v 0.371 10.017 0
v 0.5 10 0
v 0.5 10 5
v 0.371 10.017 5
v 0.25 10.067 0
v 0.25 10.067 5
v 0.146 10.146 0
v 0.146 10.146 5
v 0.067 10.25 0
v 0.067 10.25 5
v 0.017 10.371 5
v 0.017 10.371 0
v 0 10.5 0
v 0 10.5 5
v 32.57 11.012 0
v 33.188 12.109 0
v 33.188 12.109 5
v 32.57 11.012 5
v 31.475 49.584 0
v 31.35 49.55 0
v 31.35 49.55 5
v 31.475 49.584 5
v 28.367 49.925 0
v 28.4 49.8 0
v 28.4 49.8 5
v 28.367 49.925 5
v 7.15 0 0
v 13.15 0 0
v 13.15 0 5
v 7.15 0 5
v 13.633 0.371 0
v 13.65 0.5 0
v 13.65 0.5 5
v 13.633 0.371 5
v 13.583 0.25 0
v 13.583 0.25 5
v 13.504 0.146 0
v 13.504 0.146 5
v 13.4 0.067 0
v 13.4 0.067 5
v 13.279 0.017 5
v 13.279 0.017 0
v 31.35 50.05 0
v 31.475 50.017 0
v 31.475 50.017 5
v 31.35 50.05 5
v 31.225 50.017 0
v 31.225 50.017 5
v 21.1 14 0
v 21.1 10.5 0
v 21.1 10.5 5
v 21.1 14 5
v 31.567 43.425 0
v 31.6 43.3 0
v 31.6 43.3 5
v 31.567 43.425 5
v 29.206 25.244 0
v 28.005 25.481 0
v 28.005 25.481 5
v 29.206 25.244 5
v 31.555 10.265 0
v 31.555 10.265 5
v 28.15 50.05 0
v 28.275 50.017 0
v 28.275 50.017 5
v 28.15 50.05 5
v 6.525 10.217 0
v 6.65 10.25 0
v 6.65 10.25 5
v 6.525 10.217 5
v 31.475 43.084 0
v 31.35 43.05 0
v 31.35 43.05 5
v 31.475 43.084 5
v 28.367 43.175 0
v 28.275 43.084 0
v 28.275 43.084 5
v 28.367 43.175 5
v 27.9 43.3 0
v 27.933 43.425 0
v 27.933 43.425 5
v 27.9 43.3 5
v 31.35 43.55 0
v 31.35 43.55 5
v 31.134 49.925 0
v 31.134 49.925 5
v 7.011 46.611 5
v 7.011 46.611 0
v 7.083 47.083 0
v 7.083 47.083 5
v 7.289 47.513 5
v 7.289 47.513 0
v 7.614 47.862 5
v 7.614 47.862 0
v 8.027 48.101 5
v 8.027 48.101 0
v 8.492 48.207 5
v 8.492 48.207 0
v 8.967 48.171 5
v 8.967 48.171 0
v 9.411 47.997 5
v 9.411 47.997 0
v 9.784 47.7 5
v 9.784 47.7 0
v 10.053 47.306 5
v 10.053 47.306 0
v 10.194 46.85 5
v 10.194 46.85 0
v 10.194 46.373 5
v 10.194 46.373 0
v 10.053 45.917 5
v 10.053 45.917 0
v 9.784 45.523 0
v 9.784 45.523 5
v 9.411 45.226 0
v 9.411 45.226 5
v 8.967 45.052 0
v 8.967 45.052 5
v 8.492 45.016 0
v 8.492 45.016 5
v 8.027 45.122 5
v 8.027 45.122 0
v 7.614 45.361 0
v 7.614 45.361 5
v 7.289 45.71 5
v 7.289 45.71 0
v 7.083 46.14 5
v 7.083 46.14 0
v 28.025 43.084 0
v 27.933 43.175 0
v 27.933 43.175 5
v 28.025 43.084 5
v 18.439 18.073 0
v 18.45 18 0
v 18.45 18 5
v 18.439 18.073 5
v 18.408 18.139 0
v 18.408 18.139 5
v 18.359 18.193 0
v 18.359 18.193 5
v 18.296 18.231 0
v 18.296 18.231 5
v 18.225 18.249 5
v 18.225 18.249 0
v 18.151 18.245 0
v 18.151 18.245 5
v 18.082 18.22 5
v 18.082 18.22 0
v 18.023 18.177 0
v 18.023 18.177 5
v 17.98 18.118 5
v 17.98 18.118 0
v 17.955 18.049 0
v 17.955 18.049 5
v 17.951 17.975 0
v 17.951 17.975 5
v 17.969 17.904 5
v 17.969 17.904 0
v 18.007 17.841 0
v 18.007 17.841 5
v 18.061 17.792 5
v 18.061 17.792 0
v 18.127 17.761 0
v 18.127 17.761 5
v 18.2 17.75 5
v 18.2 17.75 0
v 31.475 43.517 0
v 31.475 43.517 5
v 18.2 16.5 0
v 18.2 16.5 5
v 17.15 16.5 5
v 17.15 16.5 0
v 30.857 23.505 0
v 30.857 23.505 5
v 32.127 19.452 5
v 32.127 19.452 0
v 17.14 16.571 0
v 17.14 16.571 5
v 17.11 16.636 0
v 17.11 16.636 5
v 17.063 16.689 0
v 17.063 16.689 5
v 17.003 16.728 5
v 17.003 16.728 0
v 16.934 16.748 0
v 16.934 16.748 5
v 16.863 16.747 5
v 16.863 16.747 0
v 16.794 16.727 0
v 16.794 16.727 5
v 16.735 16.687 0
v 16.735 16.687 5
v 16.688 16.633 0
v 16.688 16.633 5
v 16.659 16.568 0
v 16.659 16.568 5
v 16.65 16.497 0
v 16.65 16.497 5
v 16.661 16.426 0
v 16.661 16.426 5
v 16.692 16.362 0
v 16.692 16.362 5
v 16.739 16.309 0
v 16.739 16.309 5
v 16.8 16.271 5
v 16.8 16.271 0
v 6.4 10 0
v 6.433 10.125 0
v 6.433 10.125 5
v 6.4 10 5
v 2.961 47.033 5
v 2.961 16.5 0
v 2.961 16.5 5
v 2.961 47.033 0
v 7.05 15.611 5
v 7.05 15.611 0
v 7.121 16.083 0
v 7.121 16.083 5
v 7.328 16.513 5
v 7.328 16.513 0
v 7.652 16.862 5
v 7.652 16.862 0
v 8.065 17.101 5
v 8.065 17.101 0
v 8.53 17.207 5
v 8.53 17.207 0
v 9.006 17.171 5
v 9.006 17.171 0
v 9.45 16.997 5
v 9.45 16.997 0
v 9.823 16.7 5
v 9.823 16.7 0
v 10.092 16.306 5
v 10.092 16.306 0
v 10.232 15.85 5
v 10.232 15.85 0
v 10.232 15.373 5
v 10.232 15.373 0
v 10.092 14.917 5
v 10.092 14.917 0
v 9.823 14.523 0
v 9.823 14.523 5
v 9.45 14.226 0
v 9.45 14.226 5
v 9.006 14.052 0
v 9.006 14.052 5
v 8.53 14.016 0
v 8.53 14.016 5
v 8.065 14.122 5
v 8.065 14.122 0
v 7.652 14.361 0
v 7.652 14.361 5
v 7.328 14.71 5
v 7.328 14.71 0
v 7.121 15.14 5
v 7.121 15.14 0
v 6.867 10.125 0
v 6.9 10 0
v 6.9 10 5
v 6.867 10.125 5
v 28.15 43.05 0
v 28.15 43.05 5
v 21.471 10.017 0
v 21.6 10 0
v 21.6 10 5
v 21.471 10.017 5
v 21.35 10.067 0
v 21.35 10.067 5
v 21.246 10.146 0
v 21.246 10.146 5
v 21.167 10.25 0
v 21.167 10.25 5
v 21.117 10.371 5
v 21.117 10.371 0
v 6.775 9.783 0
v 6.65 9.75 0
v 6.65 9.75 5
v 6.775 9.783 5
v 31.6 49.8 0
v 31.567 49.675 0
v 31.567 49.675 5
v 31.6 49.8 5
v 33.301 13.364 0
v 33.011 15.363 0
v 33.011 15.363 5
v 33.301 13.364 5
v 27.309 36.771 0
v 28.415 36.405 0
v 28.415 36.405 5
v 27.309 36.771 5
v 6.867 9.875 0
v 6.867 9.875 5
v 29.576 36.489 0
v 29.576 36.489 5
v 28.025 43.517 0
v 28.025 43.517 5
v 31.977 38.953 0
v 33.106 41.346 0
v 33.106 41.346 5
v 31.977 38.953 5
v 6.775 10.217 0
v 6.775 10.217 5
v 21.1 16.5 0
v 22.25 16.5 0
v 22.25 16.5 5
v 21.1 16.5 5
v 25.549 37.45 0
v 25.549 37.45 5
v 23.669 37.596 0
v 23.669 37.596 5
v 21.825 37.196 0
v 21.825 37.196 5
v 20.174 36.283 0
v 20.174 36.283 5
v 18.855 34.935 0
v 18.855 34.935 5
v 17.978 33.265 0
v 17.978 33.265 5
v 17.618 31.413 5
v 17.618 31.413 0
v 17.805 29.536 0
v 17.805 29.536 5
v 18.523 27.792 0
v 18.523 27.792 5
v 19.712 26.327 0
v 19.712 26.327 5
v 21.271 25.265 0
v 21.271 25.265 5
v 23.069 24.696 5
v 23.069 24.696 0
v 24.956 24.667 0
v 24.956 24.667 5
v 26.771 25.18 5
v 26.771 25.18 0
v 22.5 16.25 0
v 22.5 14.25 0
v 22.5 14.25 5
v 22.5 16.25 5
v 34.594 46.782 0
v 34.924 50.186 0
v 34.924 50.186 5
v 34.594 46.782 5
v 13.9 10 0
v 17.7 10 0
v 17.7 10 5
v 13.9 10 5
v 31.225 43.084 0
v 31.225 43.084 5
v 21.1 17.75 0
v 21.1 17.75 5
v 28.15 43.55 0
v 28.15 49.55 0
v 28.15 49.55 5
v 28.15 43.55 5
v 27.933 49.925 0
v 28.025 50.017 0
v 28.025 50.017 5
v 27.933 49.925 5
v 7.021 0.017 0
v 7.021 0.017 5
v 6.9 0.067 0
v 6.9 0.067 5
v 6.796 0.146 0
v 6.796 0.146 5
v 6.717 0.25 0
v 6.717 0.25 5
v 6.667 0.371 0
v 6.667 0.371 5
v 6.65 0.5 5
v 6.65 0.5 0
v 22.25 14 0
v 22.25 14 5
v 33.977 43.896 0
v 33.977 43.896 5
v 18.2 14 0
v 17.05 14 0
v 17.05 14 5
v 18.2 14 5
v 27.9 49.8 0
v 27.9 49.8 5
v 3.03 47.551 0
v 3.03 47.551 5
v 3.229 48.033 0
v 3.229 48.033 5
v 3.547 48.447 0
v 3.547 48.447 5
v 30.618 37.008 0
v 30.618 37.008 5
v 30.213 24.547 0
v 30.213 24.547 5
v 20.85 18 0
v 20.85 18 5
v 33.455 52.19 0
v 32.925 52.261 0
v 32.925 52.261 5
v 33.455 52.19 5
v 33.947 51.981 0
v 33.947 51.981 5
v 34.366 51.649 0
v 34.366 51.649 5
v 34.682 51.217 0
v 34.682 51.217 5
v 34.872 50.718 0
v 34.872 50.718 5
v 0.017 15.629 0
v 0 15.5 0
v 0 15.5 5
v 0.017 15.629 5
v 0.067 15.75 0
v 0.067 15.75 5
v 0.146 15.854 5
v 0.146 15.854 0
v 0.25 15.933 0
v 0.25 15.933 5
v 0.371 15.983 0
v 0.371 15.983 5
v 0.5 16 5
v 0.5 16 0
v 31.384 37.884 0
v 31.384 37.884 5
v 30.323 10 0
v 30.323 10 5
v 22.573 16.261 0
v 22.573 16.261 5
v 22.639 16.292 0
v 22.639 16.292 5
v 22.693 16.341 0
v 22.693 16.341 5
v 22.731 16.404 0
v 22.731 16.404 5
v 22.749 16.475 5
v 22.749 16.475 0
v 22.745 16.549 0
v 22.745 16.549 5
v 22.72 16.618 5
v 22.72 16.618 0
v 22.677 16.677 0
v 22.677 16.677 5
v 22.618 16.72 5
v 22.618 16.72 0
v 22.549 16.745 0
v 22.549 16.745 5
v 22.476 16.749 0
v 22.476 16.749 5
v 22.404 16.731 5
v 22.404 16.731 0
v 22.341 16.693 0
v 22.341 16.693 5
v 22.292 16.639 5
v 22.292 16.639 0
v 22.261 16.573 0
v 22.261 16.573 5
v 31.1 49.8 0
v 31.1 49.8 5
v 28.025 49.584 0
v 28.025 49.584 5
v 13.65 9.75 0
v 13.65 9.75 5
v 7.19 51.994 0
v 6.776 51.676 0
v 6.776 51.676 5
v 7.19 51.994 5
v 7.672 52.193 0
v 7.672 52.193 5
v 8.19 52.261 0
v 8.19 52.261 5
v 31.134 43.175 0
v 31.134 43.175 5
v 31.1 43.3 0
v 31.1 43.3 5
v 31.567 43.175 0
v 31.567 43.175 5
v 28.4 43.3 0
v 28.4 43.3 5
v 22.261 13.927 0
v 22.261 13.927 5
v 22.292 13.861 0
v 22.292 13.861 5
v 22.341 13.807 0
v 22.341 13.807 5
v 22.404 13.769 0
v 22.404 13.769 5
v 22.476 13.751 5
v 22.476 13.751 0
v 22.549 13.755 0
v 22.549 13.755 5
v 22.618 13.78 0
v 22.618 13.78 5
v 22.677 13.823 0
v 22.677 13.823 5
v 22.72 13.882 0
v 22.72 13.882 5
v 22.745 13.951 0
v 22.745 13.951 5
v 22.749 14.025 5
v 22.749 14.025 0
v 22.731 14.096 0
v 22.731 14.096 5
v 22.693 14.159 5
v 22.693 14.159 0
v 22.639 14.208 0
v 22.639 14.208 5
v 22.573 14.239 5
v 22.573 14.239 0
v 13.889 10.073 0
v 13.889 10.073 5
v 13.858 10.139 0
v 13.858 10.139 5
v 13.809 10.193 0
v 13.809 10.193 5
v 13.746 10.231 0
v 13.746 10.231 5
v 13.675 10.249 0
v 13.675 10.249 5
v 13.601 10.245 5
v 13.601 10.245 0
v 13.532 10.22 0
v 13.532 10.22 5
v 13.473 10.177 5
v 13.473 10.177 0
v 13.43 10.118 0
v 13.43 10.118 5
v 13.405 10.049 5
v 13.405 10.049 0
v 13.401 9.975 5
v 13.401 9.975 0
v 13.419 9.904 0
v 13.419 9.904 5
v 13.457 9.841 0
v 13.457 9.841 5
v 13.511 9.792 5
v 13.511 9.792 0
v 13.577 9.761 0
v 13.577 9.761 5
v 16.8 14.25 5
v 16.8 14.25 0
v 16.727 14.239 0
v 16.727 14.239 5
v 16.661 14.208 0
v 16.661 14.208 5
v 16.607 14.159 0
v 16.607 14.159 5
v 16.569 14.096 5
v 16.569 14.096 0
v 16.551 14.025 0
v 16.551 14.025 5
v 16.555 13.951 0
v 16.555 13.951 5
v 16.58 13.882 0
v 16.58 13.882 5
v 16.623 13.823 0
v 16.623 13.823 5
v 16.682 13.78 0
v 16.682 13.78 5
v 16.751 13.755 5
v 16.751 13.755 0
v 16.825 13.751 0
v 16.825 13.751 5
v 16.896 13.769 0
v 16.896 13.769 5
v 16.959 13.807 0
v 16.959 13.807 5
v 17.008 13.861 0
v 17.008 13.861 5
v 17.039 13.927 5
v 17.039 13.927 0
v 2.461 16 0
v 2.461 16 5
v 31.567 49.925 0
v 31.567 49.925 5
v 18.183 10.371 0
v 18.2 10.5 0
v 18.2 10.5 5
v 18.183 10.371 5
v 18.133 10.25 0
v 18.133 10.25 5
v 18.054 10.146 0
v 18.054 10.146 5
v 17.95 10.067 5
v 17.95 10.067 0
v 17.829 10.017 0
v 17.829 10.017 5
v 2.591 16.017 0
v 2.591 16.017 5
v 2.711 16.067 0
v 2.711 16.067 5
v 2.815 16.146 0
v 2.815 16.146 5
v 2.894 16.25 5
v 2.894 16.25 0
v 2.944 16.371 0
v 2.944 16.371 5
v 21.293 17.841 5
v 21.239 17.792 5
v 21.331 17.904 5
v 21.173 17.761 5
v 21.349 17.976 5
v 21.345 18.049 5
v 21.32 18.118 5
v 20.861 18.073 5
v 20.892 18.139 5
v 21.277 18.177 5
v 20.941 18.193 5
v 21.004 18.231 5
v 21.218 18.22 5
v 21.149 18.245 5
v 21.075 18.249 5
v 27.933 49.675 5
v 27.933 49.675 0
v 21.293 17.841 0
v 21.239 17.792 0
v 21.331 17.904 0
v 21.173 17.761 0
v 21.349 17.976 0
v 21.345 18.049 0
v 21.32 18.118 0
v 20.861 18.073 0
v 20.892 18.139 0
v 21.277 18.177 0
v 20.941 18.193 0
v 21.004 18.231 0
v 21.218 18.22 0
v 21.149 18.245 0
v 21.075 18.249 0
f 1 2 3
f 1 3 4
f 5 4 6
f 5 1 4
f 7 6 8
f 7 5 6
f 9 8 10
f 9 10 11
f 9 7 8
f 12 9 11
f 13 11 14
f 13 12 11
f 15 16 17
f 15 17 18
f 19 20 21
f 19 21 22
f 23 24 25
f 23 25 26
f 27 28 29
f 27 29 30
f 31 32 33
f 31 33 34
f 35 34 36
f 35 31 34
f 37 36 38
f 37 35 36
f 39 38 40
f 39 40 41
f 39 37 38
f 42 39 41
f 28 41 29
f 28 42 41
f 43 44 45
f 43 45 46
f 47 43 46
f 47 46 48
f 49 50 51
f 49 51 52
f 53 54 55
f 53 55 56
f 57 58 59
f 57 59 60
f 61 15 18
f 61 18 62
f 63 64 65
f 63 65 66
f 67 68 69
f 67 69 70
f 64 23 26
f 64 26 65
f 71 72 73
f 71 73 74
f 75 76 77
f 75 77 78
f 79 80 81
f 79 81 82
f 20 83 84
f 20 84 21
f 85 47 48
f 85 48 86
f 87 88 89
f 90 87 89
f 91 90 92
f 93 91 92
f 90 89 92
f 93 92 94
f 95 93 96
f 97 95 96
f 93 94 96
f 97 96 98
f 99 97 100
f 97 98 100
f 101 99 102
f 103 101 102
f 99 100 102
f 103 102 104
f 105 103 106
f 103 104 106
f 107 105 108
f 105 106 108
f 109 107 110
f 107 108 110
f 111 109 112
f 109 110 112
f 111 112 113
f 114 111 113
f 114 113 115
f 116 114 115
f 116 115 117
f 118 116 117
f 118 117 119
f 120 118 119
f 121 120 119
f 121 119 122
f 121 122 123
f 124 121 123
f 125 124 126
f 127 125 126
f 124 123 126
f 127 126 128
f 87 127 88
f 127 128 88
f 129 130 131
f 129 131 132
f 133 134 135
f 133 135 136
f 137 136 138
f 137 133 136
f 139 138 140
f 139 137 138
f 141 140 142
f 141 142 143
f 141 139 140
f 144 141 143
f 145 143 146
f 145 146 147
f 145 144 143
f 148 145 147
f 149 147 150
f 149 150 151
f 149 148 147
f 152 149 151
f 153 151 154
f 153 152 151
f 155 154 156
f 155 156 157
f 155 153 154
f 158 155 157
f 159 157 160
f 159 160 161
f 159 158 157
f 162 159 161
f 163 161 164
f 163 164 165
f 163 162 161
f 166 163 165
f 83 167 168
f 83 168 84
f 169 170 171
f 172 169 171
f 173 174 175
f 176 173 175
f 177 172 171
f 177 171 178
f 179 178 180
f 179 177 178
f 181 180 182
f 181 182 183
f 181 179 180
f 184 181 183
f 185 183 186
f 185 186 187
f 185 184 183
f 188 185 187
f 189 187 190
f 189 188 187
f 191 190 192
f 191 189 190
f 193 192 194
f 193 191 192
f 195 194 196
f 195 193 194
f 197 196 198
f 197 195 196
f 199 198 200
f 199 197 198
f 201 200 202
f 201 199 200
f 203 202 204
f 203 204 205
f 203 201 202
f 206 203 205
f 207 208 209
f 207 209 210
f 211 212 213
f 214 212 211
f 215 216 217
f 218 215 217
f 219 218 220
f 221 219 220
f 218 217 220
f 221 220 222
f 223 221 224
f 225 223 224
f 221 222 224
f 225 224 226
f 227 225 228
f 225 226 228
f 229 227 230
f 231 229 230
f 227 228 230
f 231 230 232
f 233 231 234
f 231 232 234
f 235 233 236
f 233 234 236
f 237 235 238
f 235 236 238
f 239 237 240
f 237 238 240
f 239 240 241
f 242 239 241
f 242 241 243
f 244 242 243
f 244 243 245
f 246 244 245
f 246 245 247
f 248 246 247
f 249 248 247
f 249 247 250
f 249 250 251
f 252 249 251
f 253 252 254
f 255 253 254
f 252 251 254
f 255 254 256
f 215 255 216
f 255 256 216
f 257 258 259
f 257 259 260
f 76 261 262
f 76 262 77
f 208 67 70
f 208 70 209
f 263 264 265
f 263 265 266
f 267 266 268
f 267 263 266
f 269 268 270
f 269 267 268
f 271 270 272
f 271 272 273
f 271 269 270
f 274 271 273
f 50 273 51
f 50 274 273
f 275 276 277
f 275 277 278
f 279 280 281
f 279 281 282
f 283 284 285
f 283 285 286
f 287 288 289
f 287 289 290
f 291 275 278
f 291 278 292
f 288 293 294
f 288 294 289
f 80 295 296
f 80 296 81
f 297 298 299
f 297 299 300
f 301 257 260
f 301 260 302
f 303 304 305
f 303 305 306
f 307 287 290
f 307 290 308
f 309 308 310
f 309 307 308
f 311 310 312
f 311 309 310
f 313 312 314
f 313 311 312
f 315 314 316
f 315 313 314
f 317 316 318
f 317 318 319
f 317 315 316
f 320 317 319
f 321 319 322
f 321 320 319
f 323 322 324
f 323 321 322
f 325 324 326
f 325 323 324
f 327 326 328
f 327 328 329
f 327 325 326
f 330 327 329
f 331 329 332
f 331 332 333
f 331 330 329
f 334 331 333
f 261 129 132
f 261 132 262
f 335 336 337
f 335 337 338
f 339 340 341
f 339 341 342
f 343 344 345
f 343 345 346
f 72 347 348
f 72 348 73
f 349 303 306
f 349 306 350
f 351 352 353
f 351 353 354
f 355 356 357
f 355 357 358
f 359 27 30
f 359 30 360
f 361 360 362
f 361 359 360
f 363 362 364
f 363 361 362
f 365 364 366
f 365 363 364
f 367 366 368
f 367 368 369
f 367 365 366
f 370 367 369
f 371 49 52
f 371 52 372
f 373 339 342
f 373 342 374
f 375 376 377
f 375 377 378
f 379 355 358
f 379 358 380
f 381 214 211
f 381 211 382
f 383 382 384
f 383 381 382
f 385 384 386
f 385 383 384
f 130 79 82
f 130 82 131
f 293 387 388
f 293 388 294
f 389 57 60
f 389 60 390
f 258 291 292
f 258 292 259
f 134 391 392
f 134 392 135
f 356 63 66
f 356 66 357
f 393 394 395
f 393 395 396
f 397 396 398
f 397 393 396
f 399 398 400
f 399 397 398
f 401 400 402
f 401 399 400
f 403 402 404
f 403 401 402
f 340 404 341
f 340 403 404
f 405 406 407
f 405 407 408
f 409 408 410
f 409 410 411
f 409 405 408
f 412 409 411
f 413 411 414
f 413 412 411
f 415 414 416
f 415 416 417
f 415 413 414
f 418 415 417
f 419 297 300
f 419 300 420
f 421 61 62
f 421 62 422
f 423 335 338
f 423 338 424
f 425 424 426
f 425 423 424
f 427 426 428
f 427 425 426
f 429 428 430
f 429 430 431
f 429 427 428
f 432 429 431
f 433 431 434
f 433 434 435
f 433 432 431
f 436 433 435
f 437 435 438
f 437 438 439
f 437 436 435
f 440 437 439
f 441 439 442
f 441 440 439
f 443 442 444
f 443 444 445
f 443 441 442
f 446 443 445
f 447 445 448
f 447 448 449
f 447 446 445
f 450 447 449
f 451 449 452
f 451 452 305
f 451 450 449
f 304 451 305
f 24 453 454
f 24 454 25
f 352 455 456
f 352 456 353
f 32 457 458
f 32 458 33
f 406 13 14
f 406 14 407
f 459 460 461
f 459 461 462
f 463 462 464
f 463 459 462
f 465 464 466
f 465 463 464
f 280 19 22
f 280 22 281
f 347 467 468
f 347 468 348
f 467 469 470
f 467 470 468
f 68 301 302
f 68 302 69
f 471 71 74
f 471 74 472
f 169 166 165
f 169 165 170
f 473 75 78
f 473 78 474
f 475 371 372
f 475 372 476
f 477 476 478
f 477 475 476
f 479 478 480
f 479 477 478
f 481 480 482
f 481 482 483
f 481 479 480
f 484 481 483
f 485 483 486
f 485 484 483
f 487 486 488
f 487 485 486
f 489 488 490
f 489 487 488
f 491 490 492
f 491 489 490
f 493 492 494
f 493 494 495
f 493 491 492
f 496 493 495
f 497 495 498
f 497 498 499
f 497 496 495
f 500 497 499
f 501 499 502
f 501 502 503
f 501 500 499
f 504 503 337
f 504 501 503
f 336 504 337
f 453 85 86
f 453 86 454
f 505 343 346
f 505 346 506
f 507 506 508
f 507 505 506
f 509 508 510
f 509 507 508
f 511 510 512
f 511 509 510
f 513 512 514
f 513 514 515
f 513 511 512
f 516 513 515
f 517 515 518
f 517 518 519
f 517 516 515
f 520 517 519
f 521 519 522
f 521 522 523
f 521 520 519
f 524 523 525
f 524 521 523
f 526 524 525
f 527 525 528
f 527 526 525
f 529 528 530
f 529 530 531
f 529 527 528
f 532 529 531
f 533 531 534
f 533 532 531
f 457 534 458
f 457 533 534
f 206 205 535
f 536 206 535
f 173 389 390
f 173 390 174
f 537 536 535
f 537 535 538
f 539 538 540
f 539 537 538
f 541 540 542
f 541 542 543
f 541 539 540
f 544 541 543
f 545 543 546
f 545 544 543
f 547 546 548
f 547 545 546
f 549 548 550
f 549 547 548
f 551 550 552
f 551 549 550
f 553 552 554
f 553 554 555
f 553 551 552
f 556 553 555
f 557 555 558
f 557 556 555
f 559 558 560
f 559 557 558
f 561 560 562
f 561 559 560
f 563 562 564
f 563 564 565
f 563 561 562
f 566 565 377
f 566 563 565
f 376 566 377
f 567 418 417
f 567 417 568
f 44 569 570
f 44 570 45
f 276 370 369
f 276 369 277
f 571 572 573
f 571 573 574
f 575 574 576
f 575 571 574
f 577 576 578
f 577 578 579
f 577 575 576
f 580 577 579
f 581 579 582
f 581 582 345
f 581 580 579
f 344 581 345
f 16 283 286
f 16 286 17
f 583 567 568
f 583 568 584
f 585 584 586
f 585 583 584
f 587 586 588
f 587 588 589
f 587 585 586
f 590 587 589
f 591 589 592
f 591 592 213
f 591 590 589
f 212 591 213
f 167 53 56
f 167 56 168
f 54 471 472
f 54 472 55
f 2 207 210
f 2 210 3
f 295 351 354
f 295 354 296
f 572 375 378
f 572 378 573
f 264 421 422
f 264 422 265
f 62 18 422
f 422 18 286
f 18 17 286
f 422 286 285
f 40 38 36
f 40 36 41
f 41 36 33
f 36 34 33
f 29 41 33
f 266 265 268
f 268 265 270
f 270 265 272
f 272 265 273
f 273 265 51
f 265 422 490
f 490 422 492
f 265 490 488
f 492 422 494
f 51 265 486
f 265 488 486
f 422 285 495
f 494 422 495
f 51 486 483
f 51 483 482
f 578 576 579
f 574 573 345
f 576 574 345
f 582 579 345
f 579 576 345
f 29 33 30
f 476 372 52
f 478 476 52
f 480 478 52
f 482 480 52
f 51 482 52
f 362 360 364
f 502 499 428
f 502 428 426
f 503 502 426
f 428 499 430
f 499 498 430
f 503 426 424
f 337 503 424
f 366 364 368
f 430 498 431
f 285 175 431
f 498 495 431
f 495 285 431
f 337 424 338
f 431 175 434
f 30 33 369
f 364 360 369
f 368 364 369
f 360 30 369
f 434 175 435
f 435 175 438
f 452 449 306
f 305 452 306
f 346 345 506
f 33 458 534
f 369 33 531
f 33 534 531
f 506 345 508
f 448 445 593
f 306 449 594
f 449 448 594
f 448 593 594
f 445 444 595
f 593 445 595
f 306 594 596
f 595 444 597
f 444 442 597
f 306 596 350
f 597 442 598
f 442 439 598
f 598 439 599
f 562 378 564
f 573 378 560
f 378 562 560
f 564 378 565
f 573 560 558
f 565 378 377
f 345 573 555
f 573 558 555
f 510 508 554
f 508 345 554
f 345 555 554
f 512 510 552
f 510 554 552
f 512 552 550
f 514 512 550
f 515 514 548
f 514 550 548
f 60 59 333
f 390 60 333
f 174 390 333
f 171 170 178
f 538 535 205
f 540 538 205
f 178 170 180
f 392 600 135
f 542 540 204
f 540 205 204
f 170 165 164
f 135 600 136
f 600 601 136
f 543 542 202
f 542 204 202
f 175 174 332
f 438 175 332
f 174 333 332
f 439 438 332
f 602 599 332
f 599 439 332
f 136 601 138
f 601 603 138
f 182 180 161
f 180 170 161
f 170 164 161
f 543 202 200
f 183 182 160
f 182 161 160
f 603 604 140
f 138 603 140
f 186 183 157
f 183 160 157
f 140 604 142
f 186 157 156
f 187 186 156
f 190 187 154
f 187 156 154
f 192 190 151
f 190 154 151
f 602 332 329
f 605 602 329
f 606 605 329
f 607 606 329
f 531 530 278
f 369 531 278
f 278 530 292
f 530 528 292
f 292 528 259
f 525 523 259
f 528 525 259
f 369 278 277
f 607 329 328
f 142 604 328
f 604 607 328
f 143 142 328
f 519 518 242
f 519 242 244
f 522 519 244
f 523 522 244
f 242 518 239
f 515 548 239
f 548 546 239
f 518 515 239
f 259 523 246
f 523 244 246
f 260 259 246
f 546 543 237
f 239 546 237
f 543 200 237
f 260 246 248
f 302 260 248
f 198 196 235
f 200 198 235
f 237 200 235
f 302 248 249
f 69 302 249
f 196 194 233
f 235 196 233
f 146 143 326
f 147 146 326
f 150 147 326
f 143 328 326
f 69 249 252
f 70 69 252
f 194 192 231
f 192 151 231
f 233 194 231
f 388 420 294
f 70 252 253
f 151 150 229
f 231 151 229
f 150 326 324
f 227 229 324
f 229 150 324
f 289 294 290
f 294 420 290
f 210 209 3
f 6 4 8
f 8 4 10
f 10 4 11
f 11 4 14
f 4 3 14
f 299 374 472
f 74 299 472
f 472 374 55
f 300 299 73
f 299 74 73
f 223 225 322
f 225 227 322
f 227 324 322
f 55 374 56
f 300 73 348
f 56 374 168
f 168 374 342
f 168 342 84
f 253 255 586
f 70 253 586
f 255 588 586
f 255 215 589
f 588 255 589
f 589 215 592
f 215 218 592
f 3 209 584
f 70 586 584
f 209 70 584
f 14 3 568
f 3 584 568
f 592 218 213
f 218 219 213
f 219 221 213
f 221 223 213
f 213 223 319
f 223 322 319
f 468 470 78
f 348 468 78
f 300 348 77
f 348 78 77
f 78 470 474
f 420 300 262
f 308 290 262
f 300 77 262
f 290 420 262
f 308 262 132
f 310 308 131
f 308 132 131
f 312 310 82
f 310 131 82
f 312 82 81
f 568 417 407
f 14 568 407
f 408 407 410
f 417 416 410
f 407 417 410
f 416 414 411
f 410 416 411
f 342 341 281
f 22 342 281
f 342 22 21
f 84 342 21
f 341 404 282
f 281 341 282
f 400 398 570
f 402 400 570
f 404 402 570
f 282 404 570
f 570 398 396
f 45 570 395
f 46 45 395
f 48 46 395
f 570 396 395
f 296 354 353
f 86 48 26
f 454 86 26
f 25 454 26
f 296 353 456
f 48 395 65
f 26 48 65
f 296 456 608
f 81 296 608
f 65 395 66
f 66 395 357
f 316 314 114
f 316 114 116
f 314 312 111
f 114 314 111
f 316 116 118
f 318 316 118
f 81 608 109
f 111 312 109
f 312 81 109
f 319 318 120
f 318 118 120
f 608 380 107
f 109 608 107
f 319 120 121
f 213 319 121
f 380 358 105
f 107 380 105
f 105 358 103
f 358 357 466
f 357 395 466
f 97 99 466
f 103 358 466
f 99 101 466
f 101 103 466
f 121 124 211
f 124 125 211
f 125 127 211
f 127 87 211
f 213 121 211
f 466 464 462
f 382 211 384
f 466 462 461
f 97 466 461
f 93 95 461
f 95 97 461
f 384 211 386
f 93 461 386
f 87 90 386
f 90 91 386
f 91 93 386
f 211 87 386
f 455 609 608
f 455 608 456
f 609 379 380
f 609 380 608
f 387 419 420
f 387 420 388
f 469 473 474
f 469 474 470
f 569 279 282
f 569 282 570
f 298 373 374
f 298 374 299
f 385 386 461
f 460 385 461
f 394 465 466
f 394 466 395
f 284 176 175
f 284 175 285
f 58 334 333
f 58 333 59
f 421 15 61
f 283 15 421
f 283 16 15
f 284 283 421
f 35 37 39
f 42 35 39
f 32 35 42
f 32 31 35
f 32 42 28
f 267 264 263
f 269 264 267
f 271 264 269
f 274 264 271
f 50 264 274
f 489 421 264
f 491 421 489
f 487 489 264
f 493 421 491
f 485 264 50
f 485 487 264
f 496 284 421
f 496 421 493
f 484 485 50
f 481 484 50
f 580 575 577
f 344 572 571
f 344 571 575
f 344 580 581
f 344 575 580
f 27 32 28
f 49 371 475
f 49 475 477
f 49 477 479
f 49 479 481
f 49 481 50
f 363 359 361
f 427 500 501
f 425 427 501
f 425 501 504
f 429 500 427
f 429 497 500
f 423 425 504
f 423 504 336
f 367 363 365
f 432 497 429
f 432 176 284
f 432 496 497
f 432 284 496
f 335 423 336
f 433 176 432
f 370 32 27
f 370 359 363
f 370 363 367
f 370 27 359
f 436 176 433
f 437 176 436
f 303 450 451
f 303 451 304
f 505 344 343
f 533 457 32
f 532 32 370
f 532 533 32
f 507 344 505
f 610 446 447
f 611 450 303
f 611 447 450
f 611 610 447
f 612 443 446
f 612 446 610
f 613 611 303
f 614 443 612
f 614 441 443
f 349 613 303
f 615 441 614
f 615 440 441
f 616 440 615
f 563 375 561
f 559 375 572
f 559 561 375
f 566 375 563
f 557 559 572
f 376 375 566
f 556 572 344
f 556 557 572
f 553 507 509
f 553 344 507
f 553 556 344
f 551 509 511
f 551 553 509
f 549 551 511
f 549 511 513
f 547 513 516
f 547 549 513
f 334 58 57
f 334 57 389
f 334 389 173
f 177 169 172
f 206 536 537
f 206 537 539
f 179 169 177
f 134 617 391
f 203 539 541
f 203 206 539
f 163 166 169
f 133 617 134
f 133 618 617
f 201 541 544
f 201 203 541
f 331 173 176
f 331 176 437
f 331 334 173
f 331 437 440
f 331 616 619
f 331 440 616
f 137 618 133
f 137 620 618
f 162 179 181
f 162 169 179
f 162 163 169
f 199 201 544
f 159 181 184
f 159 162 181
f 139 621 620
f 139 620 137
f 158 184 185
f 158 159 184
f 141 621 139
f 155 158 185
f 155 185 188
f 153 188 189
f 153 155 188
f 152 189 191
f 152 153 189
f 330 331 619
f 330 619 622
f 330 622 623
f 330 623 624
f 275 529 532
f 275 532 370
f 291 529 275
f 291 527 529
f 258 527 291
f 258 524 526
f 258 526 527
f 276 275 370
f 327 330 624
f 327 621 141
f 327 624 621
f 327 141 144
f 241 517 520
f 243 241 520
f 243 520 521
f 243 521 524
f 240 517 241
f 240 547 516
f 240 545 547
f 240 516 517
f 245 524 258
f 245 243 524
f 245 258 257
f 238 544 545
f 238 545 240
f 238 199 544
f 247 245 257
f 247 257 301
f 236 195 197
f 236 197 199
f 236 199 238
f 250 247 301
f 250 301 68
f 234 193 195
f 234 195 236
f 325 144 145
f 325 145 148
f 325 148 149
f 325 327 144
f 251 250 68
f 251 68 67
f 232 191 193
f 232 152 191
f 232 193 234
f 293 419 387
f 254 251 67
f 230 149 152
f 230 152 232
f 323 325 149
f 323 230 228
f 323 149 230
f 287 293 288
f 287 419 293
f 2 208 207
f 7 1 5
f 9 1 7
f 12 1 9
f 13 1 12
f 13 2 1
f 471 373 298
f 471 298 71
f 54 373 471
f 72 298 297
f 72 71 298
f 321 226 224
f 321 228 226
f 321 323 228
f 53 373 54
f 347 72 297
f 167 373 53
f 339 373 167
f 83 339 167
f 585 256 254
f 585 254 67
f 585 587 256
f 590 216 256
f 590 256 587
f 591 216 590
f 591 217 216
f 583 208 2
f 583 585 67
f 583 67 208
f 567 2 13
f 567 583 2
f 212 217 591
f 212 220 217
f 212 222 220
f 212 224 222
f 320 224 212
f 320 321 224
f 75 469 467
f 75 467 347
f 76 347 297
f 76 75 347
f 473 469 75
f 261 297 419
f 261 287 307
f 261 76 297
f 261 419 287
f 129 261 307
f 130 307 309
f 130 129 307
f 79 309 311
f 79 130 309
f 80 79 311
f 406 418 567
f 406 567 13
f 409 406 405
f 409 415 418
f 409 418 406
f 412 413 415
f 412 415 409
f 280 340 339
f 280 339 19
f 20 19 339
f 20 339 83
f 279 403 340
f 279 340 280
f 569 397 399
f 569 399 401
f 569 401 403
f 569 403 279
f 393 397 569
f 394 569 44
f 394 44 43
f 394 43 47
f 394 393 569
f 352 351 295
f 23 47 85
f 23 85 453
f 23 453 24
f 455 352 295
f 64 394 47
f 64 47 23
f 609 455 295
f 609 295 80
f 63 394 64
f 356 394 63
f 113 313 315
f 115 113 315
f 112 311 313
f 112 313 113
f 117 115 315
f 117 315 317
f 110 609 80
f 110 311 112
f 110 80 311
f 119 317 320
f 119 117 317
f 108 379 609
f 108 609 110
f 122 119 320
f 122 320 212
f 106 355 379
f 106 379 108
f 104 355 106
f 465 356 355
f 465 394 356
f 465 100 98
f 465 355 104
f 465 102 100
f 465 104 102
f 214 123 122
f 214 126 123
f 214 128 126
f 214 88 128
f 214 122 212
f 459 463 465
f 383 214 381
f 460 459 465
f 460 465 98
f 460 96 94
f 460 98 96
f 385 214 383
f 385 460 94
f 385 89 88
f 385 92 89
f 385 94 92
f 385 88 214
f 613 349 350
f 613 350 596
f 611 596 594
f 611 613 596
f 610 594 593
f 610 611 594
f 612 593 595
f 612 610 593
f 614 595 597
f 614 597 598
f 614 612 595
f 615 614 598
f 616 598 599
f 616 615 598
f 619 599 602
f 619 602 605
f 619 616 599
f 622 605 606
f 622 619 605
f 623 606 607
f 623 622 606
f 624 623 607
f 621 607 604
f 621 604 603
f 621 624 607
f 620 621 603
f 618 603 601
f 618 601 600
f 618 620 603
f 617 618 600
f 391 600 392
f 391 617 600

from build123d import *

# Parameters (mm, degrees)
ESQUISSE1_R        = 1.6
BOSS_EXTRU_1_DEPTH = 5


with BuildPart() as part:
    # Esquisse1 → Boss.-Extru.1 (new body)
    with BuildSketch(Plane(origin=(0, 0, 0), x_dir=(-1, 0, 0), z_dir=(0, 0, -1))):
        with BuildLine():
            Line((-34.923591431, 50.185646262), (-34.593521354, 46.781705469))
            Line((-34.593521354, 46.781705469), (-33.97698121, 43.895774796))
            Line((-33.97698121, 43.895774796), (-33.105501007, 41.345514202))
            Line((-33.105501007, 41.345514202), (-31.977290744, 38.953213644))
            Line((-31.977290744, 38.953213644), (-31.383990606, 37.884363395))
            Line((-31.383990606, 37.884363395), (-30.617930427, 37.00766319))
            Line((-30.617930427, 37.00766319), (-29.575780184, 36.488623069))
            Line((-29.575780184, 36.488623069), (-28.414519914, 36.40541305))
            Line((-28.414519914, 36.40541305), (-27.309019656, 36.770573135))
            ThreePointArc((-27.309019656, 36.770573135), (-17.618450893, 31.41303394), (-26.770699625, 25.180322464))
            Line((-26.770699625, 25.180322464), (-28.005176529, 25.48125594))
            Line((-28.005176529, 25.48125594), (-29.206336809, 25.243975885))
            Line((-29.206336809, 25.243975885), (-30.212657043, 24.546555722))
            Line((-30.212657043, 24.546555722), (-30.856527193, 23.50514548))
            Line((-30.856527193, 23.50514548), (-32.12730749, 19.451734535))
            Line((-32.12730749, 19.451734535), (-33.010967696, 15.362733581))
            Line((-33.010967696, 15.362733581), (-33.301107763, 13.363943115))
            Line((-33.301107763, 13.363943115), (-33.187947737, 12.109172823))
            Line((-33.187947737, 12.109172823), (-32.569567593, 11.011512567))
            Line((-32.569567593, 11.011512567), (-31.555037356, 10.264542393))
            Line((-31.555037356, 10.264542393), (-30.323257069, 10.000002331))
            Line((-30.323257069, 10.000002331), (-21.600005036, 10.000002331))
            ThreePointArc((-21.600005036, 10.000002331), (-21.246451562, 10.146448975), (-21.100004919, 10.500002448))
            Line((-21.100004919, 10.500002448), (-21.100004919, 14.000002331))
            Line((-21.100004919, 14.000002331), (-22.250004919, 14.000002331))
            ThreePointArc((-22.250004919, 14.000002331), (-22.676781614, 13.823225636), (-22.500004919, 14.250002331))
            Line((-22.500004919, 14.250002331), (-22.500004919, 16.250002331))
            ThreePointArc((-22.500004919, 16.250002331), (-22.676781614, 16.676779027), (-22.250004919, 16.500002331))
            Line((-22.250004919, 16.500002331), (-21.100004919, 16.500002331))
            Line((-21.100004919, 16.500002331), (-21.100004919, 17.750004196))
            ThreePointArc((-21.100004919, 17.750004196), (-21.276780955, 18.176781551), (-20.850004919, 18.000002331))
            Line((-20.850004919, 18.000002331), (-18.450004919, 18.000002331))
            ThreePointArc((-18.450004919, 18.000002331), (-18.023228224, 18.176779027), (-18.200004919, 17.750002331))
            Line((-18.200004919, 17.750002331), (-18.200004919, 16.500002331))
            Line((-18.200004919, 16.500002331), (-17.15000394, 16.500002331))
            ThreePointArc((-17.15000394, 16.500002331), (-16.763072854, 16.709167045), (-16.800004919, 16.270873119))
            Line((-16.800004919, 16.270873119), (-16.800004919, 14.250002331))
            ThreePointArc((-16.800004919, 14.250002331), (-16.623228224, 13.823225636), (-17.050004919, 14.000002331))
            Line((-17.050004919, 14.000002331), (-18.200004919, 14.000002331))
            Line((-18.200004919, 14.000002331), (-18.200004919, 10.500002448))
            ThreePointArc((-18.200004919, 10.500002448), (-18.053558275, 10.146448975), (-17.700004802, 10.000002331))
            Line((-17.700004802, 10.000002331), (-13.900003182, 10.000002331))
            ThreePointArc((-13.900003182, 10.000002331), (-13.473226487, 10.176779027), (-13.650003182, 9.750002331))
            Line((-13.650003182, 9.750002331), (-13.650003182, 0.500000117))
            ThreePointArc((-13.650003182, 0.500000117), (-13.503556539, 0.146446644), (-13.150003066, 0))
            Line((-13.150003066, 0), (-7.150001767, 0))
            ThreePointArc((-7.150001767, 0), (-6.796448223, 0.146446673), (-6.65000155, 0.500000217))
            Line((-6.65000155, 0.500000217), (-6.65000155, 9.750002273))
            Line((-6.65000155, 9.750002273), (-6.775001579, 9.783495281))
            Line((-6.775001579, 9.783495281), (-6.866507601, 9.875002302))
            Line((-6.866507601, 9.875002302), (-6.900001609, 10.000002331))
            Line((-6.900001609, 10.000002331), (-6.866507601, 10.12500236))
            Line((-6.866507601, 10.12500236), (-6.775001579, 10.216512382))
            Line((-6.775001579, 10.216512382), (-6.65000155, 10.25000239))
            Line((-6.65000155, 10.25000239), (-6.525001521, 10.216512382))
            Line((-6.525001521, 10.216512382), (-6.4334955, 10.12500236))
            Line((-6.4334955, 10.12500236), (-6.400001492, 10.000002331))
            Line((-6.400001492, 10.000002331), (-0.500000117, 10.000002331))
            ThreePointArc((-0.500000117, 10.000002331), (-0.146446644, 10.146448975), (0, 10.500002448))
            Line((0, 10.500002448), (0, 15.500002215))
            ThreePointArc((0, 15.500002215), (-0.146446644, 15.853555688), (-0.500000117, 16.000002331))
            Line((-0.500000117, 16.000002331), (-2.461443863, 16.000002331))
            ThreePointArc((-2.461443863, 16.000002331), (-2.814997336, 16.146448975), (-2.96144398, 16.500002448))
            Line((-2.96144398, 16.500002448), (-2.96144398, 47.033035527))
            ThreePointArc((-2.96144398, 47.033035527), (-3.113686629, 47.798409924), (-3.547236949, 48.44726269))
            Line((-3.547236949, 48.44726269), (-6.775657869, 51.67567661))
            ThreePointArc((-6.775657869, 51.67567661), (-7.42450983, 52.109224866), (-8.18988253, 52.261466746))
            Line((-8.18988253, 52.261466746), (-32.925020965, 52.261466746))
            ThreePointArc((-32.925020965, 52.261466746), (-34.365794593, 51.648615258), (-34.923591431, 50.185646262))
        make_face()
        with Locations((-8.611451235, 46.611460467)):
            Circle(ESQUISSE1_R, mode=Mode.SUBTRACT)
        with Locations((-8.650001767, 15.611460467)):
            Circle(ESQUISSE1_R, mode=Mode.SUBTRACT)
        Polygon((-31.600007367, 43.300010094), (-31.566507359, 43.425010123), (-31.475007338, 43.516520145), (-31.350007308, 43.550010153), (-31.350007308, 49.550011551), (-31.475007338, 49.583511559), (-31.566507359, 49.67501158), (-31.600007367, 49.80001161), (-31.566507359, 49.925011639), (-31.475007338, 50.01652166), (-31.350007308, 50.050011668), (-31.225007279, 50.01652166), (-31.133507258, 49.925011639), (-31.10000725, 49.80001161), (-28.400006621, 49.80001161), (-28.366516613, 49.925011639), (-28.275006592, 50.01652166), (-28.150006562, 50.050011668), (-28.025006533, 50.01652166), (-27.933496512, 49.925011639), (-27.900006504, 49.80001161), (-27.933496512, 49.67501158), (-28.025006533, 49.583511559), (-28.150006562, 49.550011551), (-28.150006562, 43.550010153), (-28.025006533, 43.516520145), (-27.933496512, 43.425010123), (-27.900006504, 43.300010094), (-27.933496512, 43.175010065), (-28.025006533, 43.083510044), (-28.150006562, 43.050010036), (-28.275006592, 43.083510044), (-28.366516613, 43.175010065), (-28.400006621, 43.300010094), (-31.10000725, 43.300010094), (-31.133507258, 43.175010065), (-31.225007279, 43.083510044), (-31.350007308, 43.050010036), (-31.475007338, 43.083510044), (-31.566507359, 43.175010065), align=None, mode=Mode.SUBTRACT)
    extrude(amount=-BOSS_EXTRU_1_DEPTH)


solid = part.part
